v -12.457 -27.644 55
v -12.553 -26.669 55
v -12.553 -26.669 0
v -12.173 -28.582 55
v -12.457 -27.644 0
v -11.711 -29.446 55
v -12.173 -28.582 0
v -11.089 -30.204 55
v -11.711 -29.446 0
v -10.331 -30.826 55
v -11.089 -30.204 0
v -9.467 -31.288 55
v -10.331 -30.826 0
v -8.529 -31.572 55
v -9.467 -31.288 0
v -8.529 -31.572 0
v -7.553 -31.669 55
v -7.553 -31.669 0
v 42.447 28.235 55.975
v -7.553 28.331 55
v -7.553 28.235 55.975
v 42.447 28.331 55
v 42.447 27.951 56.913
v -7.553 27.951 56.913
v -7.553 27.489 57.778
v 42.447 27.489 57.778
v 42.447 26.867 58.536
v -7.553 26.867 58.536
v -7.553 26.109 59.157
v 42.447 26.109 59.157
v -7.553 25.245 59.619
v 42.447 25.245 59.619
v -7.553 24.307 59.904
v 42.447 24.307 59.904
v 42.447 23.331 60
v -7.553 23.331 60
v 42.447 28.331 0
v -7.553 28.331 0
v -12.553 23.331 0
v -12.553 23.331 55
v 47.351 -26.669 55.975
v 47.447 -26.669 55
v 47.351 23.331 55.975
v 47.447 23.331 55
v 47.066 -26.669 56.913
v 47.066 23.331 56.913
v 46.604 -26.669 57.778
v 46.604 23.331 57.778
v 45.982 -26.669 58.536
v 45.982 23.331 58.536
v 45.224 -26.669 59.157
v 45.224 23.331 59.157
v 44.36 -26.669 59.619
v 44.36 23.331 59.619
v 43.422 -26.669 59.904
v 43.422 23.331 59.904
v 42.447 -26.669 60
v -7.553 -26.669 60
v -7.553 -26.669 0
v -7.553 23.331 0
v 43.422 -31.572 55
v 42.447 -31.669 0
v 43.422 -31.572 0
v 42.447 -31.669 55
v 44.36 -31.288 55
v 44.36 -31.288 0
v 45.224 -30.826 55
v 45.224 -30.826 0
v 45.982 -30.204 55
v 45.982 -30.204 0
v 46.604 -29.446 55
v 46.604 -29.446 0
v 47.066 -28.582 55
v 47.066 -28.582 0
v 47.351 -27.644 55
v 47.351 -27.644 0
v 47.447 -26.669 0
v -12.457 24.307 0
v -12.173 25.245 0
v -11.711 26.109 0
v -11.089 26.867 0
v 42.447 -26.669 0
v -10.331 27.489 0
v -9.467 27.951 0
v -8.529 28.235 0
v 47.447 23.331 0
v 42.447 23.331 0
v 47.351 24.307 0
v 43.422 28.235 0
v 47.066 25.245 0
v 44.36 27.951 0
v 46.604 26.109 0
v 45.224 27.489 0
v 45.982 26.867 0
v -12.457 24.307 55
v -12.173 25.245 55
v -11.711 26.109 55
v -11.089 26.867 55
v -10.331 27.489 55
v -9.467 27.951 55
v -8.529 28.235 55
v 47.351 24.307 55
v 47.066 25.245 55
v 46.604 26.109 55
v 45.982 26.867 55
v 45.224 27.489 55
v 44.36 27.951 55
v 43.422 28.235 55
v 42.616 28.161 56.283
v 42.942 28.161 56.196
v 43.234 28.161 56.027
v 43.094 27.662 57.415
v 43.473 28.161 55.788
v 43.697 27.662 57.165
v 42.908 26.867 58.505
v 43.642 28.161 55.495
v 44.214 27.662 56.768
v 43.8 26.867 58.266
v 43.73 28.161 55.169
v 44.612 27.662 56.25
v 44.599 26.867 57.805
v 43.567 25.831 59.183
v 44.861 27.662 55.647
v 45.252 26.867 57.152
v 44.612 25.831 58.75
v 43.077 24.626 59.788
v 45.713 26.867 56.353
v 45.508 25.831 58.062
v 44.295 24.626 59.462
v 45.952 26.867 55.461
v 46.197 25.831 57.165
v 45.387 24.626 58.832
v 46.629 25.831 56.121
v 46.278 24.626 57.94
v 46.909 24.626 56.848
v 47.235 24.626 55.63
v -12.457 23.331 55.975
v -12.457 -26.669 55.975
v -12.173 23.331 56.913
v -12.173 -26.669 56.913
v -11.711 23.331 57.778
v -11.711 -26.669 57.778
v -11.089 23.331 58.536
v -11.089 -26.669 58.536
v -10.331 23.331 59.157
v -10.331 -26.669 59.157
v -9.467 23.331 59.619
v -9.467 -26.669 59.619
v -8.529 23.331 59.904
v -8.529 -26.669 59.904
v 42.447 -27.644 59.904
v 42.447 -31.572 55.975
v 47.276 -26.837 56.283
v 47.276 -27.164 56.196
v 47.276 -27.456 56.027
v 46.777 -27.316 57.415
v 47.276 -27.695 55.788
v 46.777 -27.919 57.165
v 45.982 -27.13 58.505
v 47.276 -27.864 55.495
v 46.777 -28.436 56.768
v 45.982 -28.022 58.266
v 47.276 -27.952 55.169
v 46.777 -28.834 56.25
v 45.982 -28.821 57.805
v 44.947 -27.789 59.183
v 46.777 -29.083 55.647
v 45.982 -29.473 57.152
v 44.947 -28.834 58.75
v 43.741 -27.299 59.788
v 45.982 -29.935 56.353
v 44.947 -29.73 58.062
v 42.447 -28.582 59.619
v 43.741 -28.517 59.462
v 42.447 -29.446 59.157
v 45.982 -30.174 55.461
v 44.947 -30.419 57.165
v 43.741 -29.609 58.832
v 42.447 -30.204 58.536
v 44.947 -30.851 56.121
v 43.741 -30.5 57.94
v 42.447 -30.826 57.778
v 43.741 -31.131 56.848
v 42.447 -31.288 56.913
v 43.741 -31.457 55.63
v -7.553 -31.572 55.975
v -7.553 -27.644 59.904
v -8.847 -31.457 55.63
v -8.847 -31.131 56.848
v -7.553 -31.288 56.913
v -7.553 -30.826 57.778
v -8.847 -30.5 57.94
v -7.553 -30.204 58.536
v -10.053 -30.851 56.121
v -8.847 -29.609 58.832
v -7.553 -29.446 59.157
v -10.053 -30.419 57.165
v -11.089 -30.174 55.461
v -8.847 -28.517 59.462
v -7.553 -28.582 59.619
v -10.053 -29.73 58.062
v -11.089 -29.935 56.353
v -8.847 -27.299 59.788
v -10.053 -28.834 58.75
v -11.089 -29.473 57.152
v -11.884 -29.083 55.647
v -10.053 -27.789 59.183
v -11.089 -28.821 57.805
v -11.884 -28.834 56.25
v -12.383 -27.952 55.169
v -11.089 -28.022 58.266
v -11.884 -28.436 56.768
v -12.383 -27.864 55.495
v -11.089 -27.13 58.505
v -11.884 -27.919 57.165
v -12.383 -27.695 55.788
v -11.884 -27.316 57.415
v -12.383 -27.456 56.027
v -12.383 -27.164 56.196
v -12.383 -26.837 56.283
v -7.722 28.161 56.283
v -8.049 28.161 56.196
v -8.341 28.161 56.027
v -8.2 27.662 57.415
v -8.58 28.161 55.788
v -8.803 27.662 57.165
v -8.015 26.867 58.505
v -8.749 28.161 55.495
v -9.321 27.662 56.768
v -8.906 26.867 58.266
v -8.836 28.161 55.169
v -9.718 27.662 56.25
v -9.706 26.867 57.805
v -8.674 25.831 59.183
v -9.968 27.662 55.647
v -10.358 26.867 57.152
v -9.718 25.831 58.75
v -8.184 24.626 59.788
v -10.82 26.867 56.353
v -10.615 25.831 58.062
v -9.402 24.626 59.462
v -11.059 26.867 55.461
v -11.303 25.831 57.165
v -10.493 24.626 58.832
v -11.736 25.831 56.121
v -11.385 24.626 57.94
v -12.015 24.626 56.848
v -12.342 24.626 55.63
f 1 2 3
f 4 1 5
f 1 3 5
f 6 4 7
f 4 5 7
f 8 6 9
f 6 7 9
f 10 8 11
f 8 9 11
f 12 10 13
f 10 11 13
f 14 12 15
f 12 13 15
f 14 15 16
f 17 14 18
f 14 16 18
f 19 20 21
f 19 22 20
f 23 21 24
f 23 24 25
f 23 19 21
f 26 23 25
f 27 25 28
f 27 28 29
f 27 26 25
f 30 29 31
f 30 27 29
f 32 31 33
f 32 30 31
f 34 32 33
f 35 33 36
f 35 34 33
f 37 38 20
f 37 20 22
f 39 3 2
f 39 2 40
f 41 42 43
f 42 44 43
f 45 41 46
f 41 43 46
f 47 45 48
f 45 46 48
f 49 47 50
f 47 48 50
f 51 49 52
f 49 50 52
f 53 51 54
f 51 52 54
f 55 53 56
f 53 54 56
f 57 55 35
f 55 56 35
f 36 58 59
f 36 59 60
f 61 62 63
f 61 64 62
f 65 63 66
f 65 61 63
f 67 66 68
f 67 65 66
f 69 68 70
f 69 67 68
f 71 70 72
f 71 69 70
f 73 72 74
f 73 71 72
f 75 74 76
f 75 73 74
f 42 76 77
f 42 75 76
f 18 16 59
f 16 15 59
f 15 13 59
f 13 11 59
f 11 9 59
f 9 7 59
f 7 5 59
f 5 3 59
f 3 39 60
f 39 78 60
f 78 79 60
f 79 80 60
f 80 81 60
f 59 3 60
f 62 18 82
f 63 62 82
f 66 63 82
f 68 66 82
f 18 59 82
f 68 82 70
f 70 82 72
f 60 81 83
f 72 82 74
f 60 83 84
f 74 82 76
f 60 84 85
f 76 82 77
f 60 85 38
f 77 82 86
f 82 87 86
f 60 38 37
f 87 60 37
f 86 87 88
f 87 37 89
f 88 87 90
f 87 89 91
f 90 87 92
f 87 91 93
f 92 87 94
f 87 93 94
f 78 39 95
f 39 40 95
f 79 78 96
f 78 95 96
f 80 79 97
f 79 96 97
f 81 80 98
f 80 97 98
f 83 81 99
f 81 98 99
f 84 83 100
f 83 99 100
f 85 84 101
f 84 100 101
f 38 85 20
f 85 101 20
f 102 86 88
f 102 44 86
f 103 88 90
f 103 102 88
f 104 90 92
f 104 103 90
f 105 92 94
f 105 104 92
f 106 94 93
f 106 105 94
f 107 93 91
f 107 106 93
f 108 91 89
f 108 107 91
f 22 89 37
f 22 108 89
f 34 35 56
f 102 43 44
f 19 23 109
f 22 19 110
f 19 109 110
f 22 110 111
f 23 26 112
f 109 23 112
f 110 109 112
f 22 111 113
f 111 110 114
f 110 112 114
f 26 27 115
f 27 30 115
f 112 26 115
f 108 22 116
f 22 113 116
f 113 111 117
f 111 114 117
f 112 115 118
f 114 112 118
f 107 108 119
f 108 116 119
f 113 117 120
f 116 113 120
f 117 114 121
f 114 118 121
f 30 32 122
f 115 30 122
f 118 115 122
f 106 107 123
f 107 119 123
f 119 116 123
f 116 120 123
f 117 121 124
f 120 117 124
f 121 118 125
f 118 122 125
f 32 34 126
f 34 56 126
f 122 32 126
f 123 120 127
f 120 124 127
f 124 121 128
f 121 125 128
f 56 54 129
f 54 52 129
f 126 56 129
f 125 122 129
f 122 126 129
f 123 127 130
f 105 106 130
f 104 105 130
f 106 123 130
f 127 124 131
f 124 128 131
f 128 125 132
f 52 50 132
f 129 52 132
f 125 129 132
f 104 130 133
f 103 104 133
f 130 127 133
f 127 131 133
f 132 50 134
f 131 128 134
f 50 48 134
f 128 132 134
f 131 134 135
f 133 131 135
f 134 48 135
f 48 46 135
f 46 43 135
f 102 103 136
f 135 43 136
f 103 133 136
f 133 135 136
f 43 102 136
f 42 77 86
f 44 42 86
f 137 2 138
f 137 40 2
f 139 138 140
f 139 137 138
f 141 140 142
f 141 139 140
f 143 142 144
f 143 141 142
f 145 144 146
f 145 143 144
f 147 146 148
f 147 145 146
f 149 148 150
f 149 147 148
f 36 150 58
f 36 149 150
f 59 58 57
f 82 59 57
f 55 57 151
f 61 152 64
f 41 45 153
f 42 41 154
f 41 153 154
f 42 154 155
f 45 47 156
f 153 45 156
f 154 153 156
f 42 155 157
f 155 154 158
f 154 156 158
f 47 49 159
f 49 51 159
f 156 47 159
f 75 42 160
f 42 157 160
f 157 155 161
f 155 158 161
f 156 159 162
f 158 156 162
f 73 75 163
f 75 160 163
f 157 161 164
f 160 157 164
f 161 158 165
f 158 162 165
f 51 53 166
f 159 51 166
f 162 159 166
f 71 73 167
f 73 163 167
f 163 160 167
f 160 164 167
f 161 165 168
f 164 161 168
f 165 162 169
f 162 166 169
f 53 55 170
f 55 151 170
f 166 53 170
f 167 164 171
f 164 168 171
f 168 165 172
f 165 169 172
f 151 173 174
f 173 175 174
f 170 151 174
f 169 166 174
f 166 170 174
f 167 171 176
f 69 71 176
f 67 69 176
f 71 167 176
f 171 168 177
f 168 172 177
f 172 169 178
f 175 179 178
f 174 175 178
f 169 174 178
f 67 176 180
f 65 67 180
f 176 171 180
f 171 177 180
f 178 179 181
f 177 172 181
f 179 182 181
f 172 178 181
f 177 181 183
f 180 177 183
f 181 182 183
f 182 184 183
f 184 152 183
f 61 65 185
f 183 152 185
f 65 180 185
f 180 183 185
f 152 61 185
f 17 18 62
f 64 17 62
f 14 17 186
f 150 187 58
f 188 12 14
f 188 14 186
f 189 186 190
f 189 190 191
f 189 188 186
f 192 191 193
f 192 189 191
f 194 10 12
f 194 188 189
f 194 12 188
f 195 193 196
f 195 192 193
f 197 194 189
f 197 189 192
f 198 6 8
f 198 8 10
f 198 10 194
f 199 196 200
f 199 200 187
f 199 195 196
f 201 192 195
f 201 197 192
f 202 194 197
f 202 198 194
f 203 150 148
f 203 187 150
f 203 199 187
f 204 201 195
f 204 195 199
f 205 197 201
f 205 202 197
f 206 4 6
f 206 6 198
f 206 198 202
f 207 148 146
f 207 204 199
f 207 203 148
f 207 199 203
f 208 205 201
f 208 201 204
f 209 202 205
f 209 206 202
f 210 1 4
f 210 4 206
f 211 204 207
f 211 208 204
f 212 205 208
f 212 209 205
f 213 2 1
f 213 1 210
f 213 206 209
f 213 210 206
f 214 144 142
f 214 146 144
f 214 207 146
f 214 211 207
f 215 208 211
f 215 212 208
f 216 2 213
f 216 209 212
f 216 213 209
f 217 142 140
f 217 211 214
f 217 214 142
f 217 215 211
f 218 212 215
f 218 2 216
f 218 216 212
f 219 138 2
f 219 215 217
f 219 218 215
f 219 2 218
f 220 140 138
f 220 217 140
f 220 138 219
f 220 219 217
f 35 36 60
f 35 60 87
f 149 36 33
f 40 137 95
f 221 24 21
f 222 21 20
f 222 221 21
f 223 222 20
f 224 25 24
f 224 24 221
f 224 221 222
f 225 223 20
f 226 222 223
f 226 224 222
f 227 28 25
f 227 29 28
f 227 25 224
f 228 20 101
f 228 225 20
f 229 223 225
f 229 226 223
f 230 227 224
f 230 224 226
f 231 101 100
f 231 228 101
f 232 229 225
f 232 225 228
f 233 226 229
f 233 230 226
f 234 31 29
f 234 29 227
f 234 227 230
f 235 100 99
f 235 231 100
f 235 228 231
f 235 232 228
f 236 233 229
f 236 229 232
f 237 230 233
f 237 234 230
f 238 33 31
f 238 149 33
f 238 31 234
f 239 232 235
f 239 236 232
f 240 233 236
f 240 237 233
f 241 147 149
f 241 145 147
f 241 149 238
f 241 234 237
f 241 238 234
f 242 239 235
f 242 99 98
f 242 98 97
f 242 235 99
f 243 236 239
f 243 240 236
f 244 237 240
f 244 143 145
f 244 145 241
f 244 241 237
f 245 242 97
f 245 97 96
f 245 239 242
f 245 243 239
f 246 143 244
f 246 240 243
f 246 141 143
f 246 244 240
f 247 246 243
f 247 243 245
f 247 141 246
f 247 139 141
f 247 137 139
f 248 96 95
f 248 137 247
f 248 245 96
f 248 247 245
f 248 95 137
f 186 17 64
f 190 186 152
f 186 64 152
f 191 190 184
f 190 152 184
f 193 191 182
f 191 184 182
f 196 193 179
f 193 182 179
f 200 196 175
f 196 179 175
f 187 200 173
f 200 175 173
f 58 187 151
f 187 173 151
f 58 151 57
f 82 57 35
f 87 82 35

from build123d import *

# Parameters (mm, degrees)
F0_W        = 60
F0_H        = 60
F1_DEPTH    = 60
F2_R        = 5
F3_T1_DEPTH = 67.5
F3_S5_W     = 5
F3_S5_H     = 5
F3_T6_DEPTH = 5
F4_T        = 5
F5_DEPTH    = 12.5


# Not quite as in the source:
# - a fillet or chamfer that OpenCascade refuses, or shapes differently, is made with other operations: its cross-section is extruded or revolved along the edge and cut away or added
# - a shell that OpenCascade refuses in one call is made with other operations: the cavity is built on its own and cut out


with BuildPart() as f1:
    # F0 (on Top) → F1 (new body)
    with BuildSketch(Plane.XY):
        with Locations((17.446616729, -1.6685388982)):
            Rectangle(F0_W, F0_H)
    extrude(amount=F1_DEPTH)

    # F2
    f2_edges = [f1.edges().sort_by_distance(p)[0] for p in [
        (17.446617, -31.668539, 60),
        (47.446617, -1.668539, 60),
        (-12.553383, -1.668539, 60),
        (17.446617, 28.331461, 60),
        (47.446617, 28.331461, 30),
        (47.446617, -31.668539, 30),
        (-12.553383, 28.331461, 30),
    ]]
    fillet(f2_edges, radius=F2_R)

    # F3: fillet of radius 5 on 1 edges, made by hand

    # F3_s2 → F3_t1 (cut)
    with BuildSketch(Plane.XY.offset(-12.5)):
        with BuildLine():
            ThreePointArc((-12.553383271, -26.6685388982), (-11.0889171769, -30.2040728042), (-7.553383271, -31.6685388982))
            Line((-7.553383271, -31.6685388982), (-12.553383271, -31.6685388982))
            Line((-12.553383271, -31.6685388982), (-12.553383271, -26.6685388982))
        make_face()
    extrude(amount=F3_T1_DEPTH, mode=Mode.SUBTRACT)


with BuildPart() as f3_tool4:
    # F3_s5 → F3_t6 (new body)
    with BuildSketch(Plane.YZ.offset(-7.553383271)):
        with Locations((-29.1685388982, 57.5)):
            Rectangle(F3_S5_W, F3_S5_H)
    extrude(amount=-F3_T6_DEPTH)

    # F3_s7 → F3_t8 (revolve, cut)
    with BuildSketch(Plane(origin=(-7.553383271, -26.6685388982, 55), x_dir=(0, 0.7071067812, -0.7071067812), z_dir=(0, 0.7071067812, 0.7071067812))):
        with BuildLine():
            ThreePointArc((0, -5), (5, 0), (0, 5))
            Line((0, 5), (0, -5))
        make_face()
    revolve(axis=Axis((-7.553383271, -26.6685388982, 55), (-1, 0, 0)), mode=Mode.SUBTRACT)


with BuildPart() as f1_1:
    add(f1.part)

    # F3_t3: cut F3_tool4
    add(f3_tool4.part, mode=Mode.SUBTRACT)

    # F4: shell of thickness 5, made by hand


with BuildPart() as f4_core1:
    # F4_t2: copy of F1
    add(f1_1.part)

    # the walls: a layer under each face that stays
    f4_faces = [f4_core1.faces().sort_by_distance(p)[0] for p in [
        (17.446616729, 28.3314611018, 27.5),
        (47.446616729, -1.6685388982, 27.5),
        (17.446616729, -31.6685388982, 27.5),
        (-12.553383271, -1.6685388982, 27.5),
        (17.446616729, -1.6685388982, 60),
    ]]
    thicken(f4_faces, amount=-F4_T, mode=Mode.SUBTRACT)


with BuildPart() as f1_2:
    add(f1_1.part)

    # what is left inside the walls is the cavity
    f4_cavity = [f4_core1.part.solids().sort_by_distance(p)[0] for p in [
        (42.396617, -1.668539, 36.666667),
    ]]
    add(f4_cavity, mode=Mode.SUBTRACT)

    # F5 (cut, symmetric): a face of the model
    f5_faces = [f1_2.faces().sort_by_distance(p)[0] for p in [
        (17.446616729, -1.6685388982, 60),
    ]]
    extrude(f5_faces, amount=F5_DEPTH, both=True, mode=Mode.SUBTRACT)


solid = f1_2.part
